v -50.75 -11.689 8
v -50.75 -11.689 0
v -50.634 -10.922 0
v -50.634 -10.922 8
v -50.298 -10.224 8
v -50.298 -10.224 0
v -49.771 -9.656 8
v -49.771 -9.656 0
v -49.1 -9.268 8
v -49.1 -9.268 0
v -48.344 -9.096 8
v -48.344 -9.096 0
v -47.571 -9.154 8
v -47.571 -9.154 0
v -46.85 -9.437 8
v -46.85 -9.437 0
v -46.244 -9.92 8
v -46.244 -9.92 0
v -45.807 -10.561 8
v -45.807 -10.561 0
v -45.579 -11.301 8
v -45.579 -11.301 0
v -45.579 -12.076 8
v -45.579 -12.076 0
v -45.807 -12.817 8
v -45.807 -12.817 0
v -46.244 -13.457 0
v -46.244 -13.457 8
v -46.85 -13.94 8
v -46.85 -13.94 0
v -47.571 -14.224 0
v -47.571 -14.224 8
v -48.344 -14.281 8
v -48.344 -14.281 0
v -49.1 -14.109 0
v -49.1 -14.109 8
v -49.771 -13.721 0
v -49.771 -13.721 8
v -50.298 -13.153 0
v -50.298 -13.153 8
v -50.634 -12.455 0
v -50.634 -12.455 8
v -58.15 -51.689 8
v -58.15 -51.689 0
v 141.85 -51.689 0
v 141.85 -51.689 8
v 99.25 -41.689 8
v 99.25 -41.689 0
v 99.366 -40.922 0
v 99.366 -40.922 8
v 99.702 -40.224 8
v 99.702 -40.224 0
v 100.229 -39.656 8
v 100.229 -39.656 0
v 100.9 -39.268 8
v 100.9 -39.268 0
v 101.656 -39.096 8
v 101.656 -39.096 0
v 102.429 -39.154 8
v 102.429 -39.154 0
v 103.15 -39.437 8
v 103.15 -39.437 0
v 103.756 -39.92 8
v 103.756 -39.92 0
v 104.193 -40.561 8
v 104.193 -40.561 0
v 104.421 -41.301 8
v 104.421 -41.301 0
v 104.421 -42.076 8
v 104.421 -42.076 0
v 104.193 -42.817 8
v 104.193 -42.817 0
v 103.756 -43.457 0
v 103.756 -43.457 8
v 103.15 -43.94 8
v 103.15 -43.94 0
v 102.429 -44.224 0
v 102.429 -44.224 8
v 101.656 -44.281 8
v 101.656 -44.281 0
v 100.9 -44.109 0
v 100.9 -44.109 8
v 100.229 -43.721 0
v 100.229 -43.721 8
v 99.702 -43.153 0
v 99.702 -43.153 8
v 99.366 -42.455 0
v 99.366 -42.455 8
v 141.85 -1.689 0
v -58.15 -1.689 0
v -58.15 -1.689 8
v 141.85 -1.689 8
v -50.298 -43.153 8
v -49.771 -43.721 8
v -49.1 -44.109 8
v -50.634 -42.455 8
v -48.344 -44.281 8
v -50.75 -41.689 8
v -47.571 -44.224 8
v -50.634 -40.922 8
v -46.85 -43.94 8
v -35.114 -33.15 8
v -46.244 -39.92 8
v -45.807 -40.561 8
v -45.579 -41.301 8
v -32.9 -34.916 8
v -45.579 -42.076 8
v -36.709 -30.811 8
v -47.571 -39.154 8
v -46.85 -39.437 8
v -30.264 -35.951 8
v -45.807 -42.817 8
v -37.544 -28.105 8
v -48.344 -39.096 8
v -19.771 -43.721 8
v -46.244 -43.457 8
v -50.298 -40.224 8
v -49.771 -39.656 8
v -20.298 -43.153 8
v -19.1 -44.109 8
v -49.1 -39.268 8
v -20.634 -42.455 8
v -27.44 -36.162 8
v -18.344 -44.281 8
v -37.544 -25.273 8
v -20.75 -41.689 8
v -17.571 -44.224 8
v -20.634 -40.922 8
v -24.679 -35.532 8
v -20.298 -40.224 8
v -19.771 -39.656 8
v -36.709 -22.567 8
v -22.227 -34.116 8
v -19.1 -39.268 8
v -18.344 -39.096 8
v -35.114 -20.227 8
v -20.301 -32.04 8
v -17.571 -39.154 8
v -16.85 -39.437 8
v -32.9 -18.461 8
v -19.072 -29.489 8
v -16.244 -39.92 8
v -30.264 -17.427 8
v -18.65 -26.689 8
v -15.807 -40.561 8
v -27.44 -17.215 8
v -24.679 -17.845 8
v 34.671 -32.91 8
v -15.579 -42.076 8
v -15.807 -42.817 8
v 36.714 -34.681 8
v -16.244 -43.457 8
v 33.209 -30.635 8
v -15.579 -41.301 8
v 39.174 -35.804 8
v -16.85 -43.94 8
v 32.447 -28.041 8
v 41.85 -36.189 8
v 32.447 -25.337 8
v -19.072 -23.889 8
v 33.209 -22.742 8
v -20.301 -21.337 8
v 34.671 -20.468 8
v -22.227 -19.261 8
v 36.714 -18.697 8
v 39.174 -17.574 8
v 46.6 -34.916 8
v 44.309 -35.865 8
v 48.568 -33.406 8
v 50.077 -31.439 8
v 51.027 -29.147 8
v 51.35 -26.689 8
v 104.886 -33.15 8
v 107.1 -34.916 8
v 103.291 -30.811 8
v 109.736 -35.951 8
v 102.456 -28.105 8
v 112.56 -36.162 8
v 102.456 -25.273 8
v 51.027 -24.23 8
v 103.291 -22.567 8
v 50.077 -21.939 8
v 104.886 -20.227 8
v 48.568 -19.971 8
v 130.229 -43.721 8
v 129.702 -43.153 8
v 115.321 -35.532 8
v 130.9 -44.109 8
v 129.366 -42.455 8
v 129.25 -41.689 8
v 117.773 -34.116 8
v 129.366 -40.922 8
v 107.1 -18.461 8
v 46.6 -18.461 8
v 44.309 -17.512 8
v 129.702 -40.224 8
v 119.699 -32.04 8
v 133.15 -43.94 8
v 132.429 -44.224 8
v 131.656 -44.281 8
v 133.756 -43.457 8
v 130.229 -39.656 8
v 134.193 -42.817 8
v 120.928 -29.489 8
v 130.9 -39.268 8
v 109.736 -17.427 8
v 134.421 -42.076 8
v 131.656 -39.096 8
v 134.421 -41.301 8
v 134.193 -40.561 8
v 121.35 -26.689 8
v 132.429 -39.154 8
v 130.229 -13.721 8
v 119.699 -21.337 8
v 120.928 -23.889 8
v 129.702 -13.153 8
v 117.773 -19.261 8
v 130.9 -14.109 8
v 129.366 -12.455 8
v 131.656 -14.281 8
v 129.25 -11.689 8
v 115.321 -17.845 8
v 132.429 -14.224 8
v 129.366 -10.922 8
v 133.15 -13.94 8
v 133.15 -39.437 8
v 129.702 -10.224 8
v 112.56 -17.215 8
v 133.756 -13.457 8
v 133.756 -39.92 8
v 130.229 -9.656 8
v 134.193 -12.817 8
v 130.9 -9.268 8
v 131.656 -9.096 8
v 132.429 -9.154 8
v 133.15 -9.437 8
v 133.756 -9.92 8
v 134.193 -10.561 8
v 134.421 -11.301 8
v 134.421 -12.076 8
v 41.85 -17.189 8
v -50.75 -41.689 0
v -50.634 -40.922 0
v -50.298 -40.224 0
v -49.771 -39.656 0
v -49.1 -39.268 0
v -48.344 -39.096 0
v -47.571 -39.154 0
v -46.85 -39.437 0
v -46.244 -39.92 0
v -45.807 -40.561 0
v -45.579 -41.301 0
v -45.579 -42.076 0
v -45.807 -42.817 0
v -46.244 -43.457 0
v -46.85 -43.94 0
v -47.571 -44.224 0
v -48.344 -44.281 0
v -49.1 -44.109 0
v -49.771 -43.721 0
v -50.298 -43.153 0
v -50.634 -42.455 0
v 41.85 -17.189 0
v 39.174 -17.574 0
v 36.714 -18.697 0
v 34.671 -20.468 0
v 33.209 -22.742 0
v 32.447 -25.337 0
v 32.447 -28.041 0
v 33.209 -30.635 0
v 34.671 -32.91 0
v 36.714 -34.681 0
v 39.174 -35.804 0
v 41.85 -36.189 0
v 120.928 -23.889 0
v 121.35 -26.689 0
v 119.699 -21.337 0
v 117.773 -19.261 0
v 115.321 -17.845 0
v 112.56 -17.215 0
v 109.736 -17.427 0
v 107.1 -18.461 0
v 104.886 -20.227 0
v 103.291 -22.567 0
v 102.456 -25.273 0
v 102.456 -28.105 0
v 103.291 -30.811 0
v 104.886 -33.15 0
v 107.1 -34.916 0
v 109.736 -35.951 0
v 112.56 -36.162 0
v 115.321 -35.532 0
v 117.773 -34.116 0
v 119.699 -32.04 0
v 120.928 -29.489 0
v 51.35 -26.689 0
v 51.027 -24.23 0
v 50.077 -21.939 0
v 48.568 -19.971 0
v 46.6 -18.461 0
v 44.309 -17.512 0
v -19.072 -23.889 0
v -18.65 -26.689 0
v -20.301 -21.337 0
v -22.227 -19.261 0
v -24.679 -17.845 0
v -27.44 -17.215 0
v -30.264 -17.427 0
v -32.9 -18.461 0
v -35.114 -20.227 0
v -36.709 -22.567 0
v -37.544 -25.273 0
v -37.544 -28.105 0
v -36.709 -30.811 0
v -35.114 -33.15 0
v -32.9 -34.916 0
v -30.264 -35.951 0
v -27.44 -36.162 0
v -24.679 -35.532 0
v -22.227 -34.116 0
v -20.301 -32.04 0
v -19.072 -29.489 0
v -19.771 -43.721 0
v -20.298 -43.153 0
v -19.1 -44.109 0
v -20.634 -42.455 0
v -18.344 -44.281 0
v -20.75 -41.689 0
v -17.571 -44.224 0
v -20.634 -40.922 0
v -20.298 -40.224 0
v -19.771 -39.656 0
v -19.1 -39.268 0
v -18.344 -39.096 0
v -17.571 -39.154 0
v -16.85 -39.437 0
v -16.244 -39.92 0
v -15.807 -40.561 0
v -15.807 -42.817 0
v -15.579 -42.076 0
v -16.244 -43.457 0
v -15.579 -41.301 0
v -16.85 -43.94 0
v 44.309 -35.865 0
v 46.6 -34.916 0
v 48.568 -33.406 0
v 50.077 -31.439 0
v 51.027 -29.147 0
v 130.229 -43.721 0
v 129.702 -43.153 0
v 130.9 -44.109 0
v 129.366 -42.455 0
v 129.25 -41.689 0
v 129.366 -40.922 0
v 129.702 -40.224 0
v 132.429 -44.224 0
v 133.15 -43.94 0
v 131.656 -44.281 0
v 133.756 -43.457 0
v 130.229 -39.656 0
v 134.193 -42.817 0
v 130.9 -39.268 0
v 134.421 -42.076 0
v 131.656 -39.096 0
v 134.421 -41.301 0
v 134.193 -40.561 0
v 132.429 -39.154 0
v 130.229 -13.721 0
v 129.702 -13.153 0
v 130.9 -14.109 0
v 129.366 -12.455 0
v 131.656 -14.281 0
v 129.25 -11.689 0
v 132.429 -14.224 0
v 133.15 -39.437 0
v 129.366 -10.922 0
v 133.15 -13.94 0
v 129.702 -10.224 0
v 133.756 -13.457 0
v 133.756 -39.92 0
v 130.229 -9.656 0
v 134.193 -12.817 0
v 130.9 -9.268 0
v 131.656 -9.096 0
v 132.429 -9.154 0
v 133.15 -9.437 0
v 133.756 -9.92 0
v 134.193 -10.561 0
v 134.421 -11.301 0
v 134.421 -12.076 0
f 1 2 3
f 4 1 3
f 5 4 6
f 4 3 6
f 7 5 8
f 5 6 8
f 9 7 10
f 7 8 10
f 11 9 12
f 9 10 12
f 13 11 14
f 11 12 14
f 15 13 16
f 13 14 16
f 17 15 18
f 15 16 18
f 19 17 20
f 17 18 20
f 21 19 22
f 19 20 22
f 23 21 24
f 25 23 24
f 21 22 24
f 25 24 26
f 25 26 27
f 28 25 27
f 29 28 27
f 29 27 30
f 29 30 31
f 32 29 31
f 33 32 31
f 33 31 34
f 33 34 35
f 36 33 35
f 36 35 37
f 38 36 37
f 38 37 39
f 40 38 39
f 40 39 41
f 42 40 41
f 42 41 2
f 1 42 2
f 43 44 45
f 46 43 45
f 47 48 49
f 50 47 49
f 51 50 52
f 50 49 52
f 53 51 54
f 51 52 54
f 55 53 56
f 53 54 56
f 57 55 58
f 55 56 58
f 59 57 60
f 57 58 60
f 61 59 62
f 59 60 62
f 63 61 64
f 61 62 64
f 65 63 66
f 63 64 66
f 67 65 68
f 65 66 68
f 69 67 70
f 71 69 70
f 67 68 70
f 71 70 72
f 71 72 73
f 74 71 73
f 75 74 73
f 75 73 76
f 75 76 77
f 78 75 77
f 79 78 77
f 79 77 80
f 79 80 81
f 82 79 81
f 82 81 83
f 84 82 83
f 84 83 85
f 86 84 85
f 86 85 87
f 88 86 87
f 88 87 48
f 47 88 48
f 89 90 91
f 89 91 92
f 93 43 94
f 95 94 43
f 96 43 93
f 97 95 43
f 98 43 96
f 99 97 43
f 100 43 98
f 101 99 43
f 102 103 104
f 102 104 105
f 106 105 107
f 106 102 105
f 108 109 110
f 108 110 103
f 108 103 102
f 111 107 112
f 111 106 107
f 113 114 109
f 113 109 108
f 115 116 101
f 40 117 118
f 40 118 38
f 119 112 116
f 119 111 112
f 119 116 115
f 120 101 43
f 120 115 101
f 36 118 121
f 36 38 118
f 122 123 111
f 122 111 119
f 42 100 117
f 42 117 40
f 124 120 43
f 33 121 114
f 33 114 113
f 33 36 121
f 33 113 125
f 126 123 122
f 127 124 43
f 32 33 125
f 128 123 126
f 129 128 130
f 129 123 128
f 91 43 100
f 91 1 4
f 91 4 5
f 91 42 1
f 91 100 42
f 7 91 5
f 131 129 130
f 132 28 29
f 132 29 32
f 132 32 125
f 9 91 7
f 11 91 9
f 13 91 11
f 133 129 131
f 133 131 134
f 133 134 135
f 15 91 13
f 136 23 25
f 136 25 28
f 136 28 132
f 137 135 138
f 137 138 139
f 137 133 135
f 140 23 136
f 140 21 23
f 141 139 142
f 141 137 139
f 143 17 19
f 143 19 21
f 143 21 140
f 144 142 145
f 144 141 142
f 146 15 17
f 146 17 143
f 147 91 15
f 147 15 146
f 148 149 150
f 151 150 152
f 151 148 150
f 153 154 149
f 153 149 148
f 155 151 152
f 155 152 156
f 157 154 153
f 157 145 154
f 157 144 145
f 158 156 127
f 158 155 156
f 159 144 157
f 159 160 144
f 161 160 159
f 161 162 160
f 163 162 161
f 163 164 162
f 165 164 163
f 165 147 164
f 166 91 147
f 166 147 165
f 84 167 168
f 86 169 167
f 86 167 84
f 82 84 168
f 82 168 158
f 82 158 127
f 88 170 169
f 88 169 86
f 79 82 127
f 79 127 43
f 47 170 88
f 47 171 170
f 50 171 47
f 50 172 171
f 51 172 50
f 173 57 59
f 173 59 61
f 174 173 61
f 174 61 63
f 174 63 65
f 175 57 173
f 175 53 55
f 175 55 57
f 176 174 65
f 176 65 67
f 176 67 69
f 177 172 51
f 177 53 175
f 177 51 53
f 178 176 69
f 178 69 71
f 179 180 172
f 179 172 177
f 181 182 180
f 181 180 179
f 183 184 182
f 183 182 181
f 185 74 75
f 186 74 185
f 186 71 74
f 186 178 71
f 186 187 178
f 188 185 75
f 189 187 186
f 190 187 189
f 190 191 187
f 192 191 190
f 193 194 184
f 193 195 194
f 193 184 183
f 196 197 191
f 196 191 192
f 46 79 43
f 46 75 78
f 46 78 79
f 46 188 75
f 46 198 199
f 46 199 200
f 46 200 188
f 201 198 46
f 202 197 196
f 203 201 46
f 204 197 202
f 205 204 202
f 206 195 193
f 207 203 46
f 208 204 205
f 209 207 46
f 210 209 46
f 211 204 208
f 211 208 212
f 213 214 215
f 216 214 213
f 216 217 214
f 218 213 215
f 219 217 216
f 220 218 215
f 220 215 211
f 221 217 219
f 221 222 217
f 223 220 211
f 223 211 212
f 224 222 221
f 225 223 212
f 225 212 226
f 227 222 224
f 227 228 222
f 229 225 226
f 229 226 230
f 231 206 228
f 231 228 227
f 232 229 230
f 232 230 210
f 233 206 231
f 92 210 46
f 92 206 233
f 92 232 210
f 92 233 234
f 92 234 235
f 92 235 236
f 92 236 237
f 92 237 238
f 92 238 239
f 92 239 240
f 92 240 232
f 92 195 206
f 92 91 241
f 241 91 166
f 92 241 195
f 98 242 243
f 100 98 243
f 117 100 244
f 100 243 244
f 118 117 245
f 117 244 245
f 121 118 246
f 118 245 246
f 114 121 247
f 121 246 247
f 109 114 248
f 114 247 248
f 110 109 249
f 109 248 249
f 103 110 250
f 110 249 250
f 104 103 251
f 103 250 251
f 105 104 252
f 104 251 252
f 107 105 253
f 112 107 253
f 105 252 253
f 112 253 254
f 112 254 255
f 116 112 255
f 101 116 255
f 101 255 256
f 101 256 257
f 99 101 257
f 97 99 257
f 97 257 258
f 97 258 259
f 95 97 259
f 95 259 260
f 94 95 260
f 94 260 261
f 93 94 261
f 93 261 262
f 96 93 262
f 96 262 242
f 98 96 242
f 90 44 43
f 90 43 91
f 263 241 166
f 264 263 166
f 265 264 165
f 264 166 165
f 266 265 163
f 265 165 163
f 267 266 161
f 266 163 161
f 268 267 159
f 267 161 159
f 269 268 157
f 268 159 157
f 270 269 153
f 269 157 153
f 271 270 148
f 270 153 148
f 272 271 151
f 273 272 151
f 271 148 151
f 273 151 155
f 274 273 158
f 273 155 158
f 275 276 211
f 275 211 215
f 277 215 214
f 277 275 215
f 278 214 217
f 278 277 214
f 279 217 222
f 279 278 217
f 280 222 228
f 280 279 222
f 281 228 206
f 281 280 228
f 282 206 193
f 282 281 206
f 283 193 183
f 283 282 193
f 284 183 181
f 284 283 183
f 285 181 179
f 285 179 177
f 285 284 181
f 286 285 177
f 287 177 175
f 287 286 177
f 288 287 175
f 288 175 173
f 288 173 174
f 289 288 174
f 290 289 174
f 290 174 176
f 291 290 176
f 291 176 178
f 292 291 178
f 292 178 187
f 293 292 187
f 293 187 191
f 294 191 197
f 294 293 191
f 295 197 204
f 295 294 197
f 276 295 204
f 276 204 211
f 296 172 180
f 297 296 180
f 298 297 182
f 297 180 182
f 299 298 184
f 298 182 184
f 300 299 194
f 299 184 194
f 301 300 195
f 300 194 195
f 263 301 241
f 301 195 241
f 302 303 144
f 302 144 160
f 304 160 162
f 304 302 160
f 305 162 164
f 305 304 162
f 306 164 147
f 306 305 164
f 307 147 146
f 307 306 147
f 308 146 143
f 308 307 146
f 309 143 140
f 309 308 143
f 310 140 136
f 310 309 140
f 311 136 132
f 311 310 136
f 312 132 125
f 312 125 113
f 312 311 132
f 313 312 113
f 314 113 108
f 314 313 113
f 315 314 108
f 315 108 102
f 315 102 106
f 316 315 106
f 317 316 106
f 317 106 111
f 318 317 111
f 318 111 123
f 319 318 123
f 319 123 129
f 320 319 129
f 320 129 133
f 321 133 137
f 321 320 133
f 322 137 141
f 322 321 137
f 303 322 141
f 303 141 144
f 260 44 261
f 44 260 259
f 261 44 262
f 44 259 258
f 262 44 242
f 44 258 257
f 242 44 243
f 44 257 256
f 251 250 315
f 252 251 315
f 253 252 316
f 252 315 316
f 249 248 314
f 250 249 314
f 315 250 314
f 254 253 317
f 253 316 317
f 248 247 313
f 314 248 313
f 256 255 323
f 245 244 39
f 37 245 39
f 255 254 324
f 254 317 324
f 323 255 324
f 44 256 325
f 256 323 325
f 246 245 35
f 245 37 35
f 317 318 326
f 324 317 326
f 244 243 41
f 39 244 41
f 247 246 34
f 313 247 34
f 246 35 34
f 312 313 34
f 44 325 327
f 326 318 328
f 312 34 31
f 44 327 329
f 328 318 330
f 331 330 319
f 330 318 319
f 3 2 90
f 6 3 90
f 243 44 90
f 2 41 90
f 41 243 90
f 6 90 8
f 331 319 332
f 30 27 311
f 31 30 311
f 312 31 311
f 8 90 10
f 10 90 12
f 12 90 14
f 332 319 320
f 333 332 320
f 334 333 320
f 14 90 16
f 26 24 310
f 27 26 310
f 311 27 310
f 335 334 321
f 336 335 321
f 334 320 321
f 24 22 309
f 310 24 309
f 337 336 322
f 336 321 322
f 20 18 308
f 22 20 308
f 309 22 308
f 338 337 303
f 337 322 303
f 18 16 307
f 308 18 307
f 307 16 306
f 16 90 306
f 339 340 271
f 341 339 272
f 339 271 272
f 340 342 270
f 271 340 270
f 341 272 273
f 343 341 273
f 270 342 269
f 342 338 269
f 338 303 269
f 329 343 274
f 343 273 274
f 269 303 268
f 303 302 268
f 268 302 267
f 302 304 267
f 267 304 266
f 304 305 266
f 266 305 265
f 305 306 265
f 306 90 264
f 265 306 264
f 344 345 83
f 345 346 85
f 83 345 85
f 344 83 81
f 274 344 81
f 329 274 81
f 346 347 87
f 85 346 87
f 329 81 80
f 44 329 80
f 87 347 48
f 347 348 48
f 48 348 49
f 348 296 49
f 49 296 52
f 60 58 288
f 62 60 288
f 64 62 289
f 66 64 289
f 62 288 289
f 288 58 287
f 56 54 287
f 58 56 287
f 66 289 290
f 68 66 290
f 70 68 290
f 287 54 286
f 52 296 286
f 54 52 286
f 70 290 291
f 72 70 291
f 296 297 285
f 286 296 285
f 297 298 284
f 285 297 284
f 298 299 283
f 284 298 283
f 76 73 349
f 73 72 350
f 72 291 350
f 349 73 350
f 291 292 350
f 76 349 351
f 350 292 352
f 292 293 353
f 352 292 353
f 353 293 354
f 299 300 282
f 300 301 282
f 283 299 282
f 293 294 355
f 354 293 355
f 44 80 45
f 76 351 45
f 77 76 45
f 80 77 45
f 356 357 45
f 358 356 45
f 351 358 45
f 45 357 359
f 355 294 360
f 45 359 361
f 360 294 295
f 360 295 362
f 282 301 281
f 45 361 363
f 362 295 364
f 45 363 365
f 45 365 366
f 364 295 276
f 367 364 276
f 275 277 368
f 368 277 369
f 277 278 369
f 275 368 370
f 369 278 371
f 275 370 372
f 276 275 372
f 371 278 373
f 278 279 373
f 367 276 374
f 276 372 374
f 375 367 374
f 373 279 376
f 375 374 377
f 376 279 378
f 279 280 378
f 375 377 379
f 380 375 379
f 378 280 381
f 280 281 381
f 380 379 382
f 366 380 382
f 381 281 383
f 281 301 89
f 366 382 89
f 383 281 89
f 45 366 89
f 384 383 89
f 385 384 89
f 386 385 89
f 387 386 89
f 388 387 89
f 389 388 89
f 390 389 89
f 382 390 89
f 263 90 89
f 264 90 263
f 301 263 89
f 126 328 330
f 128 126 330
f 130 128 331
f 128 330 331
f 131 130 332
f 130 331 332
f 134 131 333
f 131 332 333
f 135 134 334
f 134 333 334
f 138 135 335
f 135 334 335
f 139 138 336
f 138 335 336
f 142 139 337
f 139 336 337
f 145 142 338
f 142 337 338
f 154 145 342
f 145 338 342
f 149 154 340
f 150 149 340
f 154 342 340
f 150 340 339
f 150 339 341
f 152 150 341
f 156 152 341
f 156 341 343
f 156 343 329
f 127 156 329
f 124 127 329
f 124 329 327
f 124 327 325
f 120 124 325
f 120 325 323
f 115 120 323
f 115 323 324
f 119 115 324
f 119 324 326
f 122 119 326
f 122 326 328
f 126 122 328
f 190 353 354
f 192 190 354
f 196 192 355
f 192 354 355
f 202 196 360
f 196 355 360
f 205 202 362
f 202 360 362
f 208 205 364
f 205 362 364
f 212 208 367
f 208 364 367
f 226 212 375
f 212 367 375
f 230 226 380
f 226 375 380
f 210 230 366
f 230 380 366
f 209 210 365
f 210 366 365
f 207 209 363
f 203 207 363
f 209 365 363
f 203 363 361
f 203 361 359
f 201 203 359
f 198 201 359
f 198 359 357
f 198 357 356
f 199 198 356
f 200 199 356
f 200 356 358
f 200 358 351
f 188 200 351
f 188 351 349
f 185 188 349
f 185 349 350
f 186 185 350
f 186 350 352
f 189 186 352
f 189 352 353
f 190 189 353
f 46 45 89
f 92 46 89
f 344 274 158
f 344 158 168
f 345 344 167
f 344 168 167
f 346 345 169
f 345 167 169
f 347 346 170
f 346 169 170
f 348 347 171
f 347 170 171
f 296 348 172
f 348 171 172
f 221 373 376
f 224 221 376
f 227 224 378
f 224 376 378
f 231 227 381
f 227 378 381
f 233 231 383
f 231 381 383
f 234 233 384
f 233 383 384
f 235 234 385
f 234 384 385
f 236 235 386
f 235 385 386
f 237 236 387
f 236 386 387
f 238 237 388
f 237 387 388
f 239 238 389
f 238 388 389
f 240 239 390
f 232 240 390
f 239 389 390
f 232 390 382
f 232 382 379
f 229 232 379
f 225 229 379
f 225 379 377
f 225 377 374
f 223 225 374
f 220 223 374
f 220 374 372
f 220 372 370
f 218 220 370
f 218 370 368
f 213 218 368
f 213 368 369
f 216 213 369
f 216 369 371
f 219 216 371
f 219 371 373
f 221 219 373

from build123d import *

# Parameters (mm, degrees)
IZIM1_W                              = 100
IZIM1_H                              = 50
IZIM1_R                              = 2.476303865
IZIM1_R_2                            = 9.5
IZIM1_R_3                            = 2.283039358
Y_KSEKLIK_EKSTR_ZYON1_DEPTH          = 8
M5_HELISARMAL_I_IN_Z_VANA_MATKAB_1_D = 5.2
M5_HELISARMAL_I_IN_Z_VANA_MATKAB_2_D = 5.2
KES_EKSTR_ZYON1_DEPTH                = 10


with BuildPart() as part:
    # Çizim1 → Yükseklik-Ekstrüzyon1 (new body)
    # profile 1 of 6: a face of its own
    with BuildSketch(Plane.XY):
        with Locations((91.850220264, -26.688693098)):
            Rectangle(IZIM1_W, IZIM1_H)
        with Locations((131.850220264, -41.688693098)):
            Circle(IZIM1_R, mode=Mode.SUBTRACT)
        with Locations((111.850220264, -26.688693098)):
            Circle(IZIM1_R_2, mode=Mode.SUBTRACT)
        with Locations((131.850220264, -11.688693098)):
            Circle(IZIM1_R_3, mode=Mode.SUBTRACT)
    # profile 2 of 6: a face of its own
    with BuildSketch(Plane.XY):
        with Locations((-8.149779736, -26.688693098)):
            Rectangle(IZIM1_W, IZIM1_H)
        with Locations((-48.149779736, -41.688693098)):
            Circle(IZIM1_R, mode=Mode.SUBTRACT)
        with Locations((-28.149779736, -26.688693098)):
            Circle(IZIM1_R_2, mode=Mode.SUBTRACT)
        with Locations((-48.149779736, -11.688693098)):
            Circle(IZIM1_R_3, mode=Mode.SUBTRACT)
    # profile 3 of 6: a face of its own
    with BuildSketch(Plane.XY):
        with Locations((-48.149779736, -11.688693098)):
            Circle(IZIM1_R_3)
    # profile 4 of 6: a face of its own
    with BuildSketch(Plane.XY):
        with Locations((-48.149779736, -41.688693098)):
            Circle(IZIM1_R)
    # profile 5 of 6: a face of its own
    with BuildSketch(Plane.XY):
        with Locations((131.850220264, -11.688693098)):
            Circle(IZIM1_R_3)
    # profile 6 of 6: a face of its own
    with BuildSketch(Plane.XY):
        with Locations((131.850220264, -41.688693098)):
            Circle(IZIM1_R)
    extrude(amount=Y_KSEKLIK_EKSTR_ZYON1_DEPTH)

    # M5 Helisarmal için Zıvana matkabı1 (through all)
    with Locations(Plane.XY.offset(8)):
        with Locations((-48.149779736, -11.688693098), (-48.149779736, -41.688693098), (131.850220264, -41.688693098), (131.850220264, -11.688693098)):
            Hole(M5_HELISARMAL_I_IN_Z_VANA_MATKAB_1_D / 2)

    # M5 Helisarmal için Zıvana matkabı2 (through all)
    with Locations(Plane(origin=(-18.149779736, -41.688693098, 8), x_dir=(1, 0, 0), z_dir=(0, 0, 1))):
        with Locations((0, 0), (120, 0)):
            Hole(M5_HELISARMAL_I_IN_Z_VANA_MATKAB_2_D / 2)

    # Çizim7 → Kes-Ekstrüzyon1 (cut)
    with BuildSketch(Plane.XY.offset(8)):
        with BuildLine():
            ThreePointArc((51.350220264, -26.688693098), (48.567734686, -19.971178677), (41.850220264, -17.188693098))
            Line((41.850220264, -17.188693098), (41.850220264, -36.188693098))
            ThreePointArc((41.850220264, -36.188693098), (48.567734686, -33.40620752), (51.350220264, -26.688693098))
        make_face()
        with BuildLine():
            Line((41.850220264, -36.188693098), (41.850220264, -17.188693098))
            ThreePointArc((41.850220264, -17.188693098), (32.350220264, -26.688693098), (41.850220264, -36.188693098))
        make_face()
    extrude(amount=-KES_EKSTR_ZYON1_DEPTH, mode=Mode.SUBTRACT)


solid = part.part
